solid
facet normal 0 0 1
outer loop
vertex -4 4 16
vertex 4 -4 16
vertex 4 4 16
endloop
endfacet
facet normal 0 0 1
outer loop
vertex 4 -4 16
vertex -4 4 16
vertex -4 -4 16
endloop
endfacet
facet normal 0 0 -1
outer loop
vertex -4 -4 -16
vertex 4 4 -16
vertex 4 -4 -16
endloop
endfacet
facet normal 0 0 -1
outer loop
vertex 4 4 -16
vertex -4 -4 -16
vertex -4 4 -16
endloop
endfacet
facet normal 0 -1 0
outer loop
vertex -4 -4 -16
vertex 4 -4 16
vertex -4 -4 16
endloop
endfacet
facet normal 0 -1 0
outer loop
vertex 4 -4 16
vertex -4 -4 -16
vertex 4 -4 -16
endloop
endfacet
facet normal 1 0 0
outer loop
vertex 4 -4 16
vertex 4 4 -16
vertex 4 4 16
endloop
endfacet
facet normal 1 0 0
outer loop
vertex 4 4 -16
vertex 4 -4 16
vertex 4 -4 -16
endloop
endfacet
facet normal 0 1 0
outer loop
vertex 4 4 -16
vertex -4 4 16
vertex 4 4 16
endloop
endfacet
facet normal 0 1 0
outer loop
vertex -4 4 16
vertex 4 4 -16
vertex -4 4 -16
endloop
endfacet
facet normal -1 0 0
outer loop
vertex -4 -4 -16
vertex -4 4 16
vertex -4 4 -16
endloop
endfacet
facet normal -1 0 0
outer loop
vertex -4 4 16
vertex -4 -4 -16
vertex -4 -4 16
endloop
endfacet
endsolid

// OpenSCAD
size=32; //block=32 //item=8

cube([size*0.25,size*0.25,size*1],center=true);	//base
